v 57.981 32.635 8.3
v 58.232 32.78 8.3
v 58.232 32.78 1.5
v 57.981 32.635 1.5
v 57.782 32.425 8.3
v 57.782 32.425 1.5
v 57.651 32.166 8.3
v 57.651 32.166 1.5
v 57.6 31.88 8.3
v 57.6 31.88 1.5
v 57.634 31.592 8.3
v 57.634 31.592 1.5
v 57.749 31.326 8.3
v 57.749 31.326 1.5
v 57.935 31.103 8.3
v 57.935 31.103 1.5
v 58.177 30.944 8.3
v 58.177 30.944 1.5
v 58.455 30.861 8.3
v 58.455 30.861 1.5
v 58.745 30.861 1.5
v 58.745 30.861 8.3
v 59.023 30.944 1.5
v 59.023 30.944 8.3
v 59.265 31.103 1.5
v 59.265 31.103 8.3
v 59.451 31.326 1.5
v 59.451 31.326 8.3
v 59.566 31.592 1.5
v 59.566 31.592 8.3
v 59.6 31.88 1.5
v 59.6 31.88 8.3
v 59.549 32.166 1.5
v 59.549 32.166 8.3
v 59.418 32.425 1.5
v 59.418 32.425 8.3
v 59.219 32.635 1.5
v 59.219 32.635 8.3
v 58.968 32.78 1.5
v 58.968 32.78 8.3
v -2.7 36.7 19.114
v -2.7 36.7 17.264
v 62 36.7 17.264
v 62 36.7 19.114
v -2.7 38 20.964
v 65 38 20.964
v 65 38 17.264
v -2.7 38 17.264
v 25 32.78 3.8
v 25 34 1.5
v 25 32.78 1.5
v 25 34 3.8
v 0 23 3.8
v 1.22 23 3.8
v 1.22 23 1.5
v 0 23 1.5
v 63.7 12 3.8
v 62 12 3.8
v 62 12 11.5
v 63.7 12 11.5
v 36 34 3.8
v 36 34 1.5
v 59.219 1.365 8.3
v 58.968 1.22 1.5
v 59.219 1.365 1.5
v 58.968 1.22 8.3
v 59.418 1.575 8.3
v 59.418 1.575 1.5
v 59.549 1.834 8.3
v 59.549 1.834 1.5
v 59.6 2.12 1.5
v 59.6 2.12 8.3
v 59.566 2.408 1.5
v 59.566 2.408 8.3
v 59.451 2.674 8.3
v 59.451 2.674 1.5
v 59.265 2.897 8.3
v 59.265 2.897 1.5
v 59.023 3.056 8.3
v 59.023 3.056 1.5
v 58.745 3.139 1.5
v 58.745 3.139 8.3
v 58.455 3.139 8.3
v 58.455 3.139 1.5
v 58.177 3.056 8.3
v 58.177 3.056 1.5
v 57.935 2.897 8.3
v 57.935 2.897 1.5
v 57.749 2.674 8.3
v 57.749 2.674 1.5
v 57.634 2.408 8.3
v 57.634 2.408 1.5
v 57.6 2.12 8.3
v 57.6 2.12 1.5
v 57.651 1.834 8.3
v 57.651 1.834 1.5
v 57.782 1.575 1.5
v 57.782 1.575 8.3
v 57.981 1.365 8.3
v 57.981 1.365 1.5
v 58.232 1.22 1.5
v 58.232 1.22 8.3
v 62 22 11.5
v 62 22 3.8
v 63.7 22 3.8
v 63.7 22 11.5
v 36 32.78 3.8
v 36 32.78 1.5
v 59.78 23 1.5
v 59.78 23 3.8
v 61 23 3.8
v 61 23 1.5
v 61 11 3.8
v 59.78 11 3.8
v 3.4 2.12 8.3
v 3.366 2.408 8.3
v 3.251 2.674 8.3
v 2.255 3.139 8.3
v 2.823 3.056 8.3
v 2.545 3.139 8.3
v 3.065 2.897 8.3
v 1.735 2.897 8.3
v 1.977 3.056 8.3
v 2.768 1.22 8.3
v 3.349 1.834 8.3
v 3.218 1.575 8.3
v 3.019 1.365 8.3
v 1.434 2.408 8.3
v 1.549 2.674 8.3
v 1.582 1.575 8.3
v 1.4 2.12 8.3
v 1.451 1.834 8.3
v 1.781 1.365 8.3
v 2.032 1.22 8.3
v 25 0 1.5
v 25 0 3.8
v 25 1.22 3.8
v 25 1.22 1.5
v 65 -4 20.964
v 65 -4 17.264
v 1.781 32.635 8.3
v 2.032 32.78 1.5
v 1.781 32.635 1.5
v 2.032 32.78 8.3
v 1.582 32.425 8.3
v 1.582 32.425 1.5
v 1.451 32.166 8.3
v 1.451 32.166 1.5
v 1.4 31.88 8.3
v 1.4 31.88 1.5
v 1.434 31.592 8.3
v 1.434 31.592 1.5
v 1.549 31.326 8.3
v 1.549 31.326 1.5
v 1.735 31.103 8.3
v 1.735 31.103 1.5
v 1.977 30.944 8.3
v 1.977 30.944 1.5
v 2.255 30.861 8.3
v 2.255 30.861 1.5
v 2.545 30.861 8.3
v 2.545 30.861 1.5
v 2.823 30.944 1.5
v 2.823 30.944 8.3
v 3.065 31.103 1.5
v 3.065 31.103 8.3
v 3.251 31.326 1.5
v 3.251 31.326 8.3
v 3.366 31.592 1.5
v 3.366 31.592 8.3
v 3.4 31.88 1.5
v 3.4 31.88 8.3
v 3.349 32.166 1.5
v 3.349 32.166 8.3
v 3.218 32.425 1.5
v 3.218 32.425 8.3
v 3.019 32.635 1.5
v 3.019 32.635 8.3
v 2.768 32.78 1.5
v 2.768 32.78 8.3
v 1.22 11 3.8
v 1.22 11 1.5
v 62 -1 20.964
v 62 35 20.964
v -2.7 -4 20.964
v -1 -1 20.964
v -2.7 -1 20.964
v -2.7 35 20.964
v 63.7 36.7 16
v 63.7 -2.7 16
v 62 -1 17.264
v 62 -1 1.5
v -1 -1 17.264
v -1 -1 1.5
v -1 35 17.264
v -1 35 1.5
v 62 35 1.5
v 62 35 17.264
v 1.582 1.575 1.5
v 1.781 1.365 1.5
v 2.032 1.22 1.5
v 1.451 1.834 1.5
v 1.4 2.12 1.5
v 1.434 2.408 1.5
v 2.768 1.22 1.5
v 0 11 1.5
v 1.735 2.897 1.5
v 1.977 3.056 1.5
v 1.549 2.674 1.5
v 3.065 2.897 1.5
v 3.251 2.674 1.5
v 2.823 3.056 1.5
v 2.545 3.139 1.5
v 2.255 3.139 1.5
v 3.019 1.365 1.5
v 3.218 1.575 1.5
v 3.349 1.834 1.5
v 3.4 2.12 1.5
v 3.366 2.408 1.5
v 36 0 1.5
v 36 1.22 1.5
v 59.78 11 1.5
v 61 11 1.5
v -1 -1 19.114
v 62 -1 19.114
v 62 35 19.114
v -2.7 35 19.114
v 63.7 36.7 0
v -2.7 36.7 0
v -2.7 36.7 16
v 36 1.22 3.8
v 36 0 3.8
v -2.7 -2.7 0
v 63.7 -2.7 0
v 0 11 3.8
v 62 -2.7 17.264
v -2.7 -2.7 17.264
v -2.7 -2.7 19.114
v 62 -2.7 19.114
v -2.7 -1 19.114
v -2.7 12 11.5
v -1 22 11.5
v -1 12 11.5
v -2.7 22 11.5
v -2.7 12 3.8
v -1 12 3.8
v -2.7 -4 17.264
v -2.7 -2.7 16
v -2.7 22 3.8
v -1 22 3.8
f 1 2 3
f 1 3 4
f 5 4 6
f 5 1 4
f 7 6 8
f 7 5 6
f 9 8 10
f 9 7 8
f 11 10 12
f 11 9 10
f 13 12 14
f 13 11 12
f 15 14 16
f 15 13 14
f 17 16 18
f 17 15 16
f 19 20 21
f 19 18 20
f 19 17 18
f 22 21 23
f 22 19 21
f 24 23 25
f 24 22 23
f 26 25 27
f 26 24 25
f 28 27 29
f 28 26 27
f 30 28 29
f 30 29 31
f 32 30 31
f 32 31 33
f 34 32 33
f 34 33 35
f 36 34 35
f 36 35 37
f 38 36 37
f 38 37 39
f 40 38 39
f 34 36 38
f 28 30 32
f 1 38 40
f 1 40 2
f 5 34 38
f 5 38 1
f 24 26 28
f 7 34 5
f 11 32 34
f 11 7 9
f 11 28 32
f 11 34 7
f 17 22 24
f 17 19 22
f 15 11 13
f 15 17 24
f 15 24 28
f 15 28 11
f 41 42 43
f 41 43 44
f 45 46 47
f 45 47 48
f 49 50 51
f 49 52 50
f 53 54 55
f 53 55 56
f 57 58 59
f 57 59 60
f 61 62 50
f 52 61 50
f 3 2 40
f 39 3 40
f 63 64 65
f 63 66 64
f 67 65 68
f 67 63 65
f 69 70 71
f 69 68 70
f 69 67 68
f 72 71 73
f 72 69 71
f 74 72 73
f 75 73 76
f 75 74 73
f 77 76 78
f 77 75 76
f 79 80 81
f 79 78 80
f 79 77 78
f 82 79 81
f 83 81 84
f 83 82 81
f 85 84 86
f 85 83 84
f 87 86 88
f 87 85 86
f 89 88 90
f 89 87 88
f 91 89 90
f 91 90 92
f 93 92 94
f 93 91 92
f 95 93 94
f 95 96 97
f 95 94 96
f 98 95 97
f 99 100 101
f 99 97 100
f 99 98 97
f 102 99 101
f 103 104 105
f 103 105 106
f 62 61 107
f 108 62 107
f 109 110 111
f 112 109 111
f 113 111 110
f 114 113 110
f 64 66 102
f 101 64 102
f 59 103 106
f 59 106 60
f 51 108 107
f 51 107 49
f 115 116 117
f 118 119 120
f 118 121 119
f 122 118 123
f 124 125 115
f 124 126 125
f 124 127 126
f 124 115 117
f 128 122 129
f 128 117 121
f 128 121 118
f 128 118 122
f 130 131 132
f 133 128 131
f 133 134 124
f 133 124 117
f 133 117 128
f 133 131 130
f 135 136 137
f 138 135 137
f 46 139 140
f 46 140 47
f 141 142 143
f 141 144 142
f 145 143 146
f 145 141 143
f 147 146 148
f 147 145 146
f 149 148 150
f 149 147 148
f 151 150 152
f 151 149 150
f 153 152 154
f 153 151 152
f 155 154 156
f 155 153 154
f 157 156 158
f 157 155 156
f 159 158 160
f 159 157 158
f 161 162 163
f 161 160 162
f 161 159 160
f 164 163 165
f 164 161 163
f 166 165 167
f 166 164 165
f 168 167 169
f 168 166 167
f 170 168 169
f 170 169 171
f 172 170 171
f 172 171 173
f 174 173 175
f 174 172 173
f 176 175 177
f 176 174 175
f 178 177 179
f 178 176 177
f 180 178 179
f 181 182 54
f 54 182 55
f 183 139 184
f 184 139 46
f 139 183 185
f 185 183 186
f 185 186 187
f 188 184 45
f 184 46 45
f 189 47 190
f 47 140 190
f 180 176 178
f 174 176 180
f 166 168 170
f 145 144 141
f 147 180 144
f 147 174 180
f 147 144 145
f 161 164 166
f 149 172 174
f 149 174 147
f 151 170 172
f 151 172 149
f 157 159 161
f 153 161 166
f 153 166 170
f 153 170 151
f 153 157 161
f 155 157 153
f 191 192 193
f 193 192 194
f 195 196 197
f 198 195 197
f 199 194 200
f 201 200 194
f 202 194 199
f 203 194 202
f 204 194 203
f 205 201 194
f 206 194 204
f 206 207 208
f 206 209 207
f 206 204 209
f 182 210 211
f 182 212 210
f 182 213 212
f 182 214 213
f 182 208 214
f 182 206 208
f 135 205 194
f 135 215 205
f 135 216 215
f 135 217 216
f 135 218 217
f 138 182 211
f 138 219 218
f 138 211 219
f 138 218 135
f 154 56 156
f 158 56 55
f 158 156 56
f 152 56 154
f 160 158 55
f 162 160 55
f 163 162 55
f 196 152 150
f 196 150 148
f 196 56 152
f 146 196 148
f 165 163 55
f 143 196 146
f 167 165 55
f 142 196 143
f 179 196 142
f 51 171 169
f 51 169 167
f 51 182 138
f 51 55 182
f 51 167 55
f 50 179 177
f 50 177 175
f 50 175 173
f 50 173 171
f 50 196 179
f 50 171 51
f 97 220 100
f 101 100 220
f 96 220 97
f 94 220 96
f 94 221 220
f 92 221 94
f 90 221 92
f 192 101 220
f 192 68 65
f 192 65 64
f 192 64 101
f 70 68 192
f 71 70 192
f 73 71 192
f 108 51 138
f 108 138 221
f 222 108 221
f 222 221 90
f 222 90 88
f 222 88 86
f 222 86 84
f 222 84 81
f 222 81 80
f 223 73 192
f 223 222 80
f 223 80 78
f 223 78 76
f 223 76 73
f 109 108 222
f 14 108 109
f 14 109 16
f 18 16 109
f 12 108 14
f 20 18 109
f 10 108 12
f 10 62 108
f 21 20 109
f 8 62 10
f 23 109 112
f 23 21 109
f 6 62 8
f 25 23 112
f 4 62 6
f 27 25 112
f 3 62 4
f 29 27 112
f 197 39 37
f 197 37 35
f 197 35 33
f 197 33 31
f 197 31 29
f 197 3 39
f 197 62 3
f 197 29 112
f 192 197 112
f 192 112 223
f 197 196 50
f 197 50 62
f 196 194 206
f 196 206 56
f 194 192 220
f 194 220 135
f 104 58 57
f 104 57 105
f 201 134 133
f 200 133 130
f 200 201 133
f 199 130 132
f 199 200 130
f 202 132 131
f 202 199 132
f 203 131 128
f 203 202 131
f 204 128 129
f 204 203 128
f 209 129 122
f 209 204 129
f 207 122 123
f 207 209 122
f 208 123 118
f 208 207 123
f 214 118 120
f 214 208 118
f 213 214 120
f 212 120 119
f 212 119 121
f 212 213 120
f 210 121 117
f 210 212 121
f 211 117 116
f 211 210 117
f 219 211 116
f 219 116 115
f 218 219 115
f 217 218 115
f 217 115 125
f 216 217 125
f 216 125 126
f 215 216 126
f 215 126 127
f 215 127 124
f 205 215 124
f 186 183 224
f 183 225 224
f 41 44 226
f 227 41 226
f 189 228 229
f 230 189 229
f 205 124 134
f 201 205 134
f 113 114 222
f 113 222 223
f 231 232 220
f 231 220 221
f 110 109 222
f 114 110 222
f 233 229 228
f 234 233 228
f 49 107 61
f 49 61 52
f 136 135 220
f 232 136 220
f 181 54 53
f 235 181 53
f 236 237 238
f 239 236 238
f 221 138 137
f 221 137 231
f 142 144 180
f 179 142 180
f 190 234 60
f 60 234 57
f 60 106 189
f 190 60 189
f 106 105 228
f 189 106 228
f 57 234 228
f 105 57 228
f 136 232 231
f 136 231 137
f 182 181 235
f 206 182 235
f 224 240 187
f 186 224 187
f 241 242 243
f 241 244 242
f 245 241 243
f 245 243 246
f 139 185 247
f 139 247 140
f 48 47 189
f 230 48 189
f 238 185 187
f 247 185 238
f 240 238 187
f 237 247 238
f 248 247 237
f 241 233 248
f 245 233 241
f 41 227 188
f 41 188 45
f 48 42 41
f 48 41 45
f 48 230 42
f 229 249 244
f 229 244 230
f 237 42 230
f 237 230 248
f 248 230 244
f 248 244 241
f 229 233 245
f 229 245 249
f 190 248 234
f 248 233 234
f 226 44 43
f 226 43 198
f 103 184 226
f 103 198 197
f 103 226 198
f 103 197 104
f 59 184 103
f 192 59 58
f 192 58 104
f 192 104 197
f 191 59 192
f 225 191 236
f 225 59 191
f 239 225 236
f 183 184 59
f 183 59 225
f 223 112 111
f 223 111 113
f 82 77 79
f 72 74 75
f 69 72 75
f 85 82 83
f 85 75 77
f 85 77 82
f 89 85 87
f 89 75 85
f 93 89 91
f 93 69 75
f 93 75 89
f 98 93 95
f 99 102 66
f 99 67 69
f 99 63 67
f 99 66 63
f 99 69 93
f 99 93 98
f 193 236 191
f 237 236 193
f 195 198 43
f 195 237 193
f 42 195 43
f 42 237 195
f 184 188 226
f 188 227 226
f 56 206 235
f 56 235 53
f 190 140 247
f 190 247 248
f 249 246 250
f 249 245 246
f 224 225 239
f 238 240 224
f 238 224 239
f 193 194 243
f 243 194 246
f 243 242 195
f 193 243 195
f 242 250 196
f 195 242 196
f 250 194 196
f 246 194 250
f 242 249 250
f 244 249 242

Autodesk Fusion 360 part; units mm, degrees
sketch "Spodek" plane through (0, 0, 0) normal (0, 0, 1) x (1, 0, 0)
  line L0 (0, 0) -> (61, 0)
  line L1 (61, 0) -> (61, 34)
  line L2 (61, 34) -> (0, 34)
  line L3 (0, 34) -> (0, 0)
  line L4 (-1, 35) -> (62, 35)
  line L5 (62, 35) -> (62, -1)
  line L6 (62, -1) -> (-1, -1)
  line L7 (-1, -1) -> (-1, 35)
  line L8 (-2.7, -2.7) -> (-2.7, 36.7) construction
  line L9 (63.7, 36.7) -> (-2.7, 36.7) construction
  line L10 (63.7, -2.7) -> (63.7, 36.7) construction
  line L11 (63.7, -2.7) -> (-2.7, -2.7) construction
  line L12 (-2.7, -2.7) -> (63.7, -2.7)
  line L13 (63.7, -2.7) -> (63.7, 36.7)
  line L14 (63.7, 36.7) -> (-2.7, 36.7)
  line L15 (-2.7, 36.7) -> (-2.7, -2.7)
  dimension "d1" = 61
  dimension "d2" = 34
  dimension "d3" = 63
  dimension "d4" = 36
  dimension "d5" = 1.7
  dimension "d6" = 1.7
  dimension "d7" = 1.7
  dimension "d8" = 1.7
sketch "TotoNevim" plane through (0, 0, 0) normal (0, 0, 1) x (1, 0, 0)
extrude "Extrude1" add sketch "Spodek" along normal blind 12 contours L12 L13 L14 L15 makes body 1
extrude "Extrude2" add sketch "Spodek" along normal blind 1.5 contours L0 L1 L2 L3 | L4 L5 L6 L7 bodies 1
sketch "Sketch3" plane through (0, 0, 1.5) normal (0, 0, 1) x (-1, 0, 0)
  line L0 (1, 1) -> (-62, 1)
  line L1 (-62, 1) -> (-62, -35)
  line L2 (-62, -35) -> (1, -35)
  line L3 (1, -35) -> (1, 1)
  line L4 (-59.78, -32.78) -> (-1.22, -32.78)
  line L5 (-1.22, -32.78) -> (-1.22, -1.22)
  line L6 (-1.22, -1.22) -> (-59.78, -1.22)
  line L7 (-59.78, -1.22) -> (-59.78, -32.78)
  line L8 (-61, 0) -> (-61, -34)
  line L9 (0, 0) -> (-61, 0)
  line L10 (0, -34) -> (0, 0)
  line L11 (-61, -34) -> (0, -34)
  dimension "d13" = 1.22
  dimension "d14" = 1.22
  dimension "d15" = 1.22
  dimension "d16" = 1.22
extrude "Extrude3" add sketch "Sketch3" along normal blind 1.8 contours L8 L9 L10 L11 bodies 1
extrude "Extrude4" add 1 faces at (20, -2.1333, 12) along direction (0, 0, 1) blind 5.243 on bodies 1 bodies 1
extrude "Extrude5" add 1 faces at (20, -2.1333, 17.243) along direction (0, 0, 1) blind 0.021 on bodies 1 bodies 1
sketch "Prurez1" plane through (-2.7, 0, 0) normal (-1, 0, 0) x (0, -1, 0)
  line L0 (-36.7, 0) -> (2.7, 0)
  line L1 (2.7, 0) -> (2.7, 17.264)
  line L2 (2.7, 17.264) -> (-36.7, 17.264)
  line L3 (-36.7, 17.264) -> (-36.7, 0)
  line L4 (-12, 3.3) -> (-12, 11) construction
  line L5 (0, 1.5) -> (0, 3.3) construction
  line L6 (-22, 11) -> (-22, 3.3) construction
  line L7 (-34, 3.3) -> (-34, 11) construction
  line L8 (-35, 1.5) -> (-35, 17.264) construction
  line L9 (-22, 11) -> (-12, 11) construction
  line L10 (-12, 11) -> (-12, 3.3) construction
  line L11 (-12, 3.3) -> (-22, 3.3) construction
  line L12 (-22, 3.3) -> (-22, 11) construction
  line L13 (-22, 11) -> (-12, 11)
  line L14 (-12, 11) -> (-12, 3.3)
  line L15 (-12, 3.3) -> (-22, 3.3)
  line L16 (-22, 3.3) -> (-22, 11)
  dimension "d23" = 7.7
  dimension "d24" = 12
  dimension "d25" = 12
  dimension "d26" = 1
extrude "Extrude6" cut sketch "Prurez1" against normal up to surface (66.4 mm away) contours L13 L14 L15 L16 bodies 1
sketch "Sketch5" plane through (0, 0, 17.264) normal (0, 0, 1) x (-1, 0, 0)
  line L0 (-62, 1) -> (1, 1)
  line L1 (1, 1) -> (1, -35)
  line L2 (1, -35) -> (-62, -35)
  line L3 (-62, -35) -> (-62, 1)
  line L4 (2.7, -36.7) -> (2.7, 2.7)
  line L5 (2.7, 2.7) -> (-63.7, 2.7)
  line L6 (-63.7, 2.7) -> (-63.7, -36.7)
  line L7 (-63.7, -36.7) -> (2.7, -36.7)
  line L8 (2.7, -36.7) -> (-63.7, -36.7)
  line L9 (-63.7, -36.7) -> (-63.7, 2.7)
  line L10 (-63.7, 2.7) -> (2.7, 2.7)
  line L11 (2.7, 2.7) -> (2.7, -36.7)
  line L12 (1, -35) -> (-62, -35)
  line L13 (-62, -35) -> (-62, 1)
  line L14 (-62, 1) -> (1, 1)
  line L15 (1, 1) -> (1, -35)
extrude "Extrude7" add sketch "Sketch5" along normal blind 3.7 bodies 1
sketch "Sketch6" plane through (-2.7, 0, 0) normal (-1, 0, 0) x (0, -1, 0)
  line L0 (-22, 3.3) -> (-22, 11)
  line L1 (-22, 11) -> (-12, 11)
  line L2 (-12, 11) -> (-12, 3.3)
  line L3 (-12, 3.3) -> (-22, 3.3)
  line L4 (-36.7, 0) -> (2.7, 0)
  line L5 (2.7, 0) -> (2.7, 20.964)
  line L6 (2.7, 20.964) -> (-36.7, 20.964)
  line L7 (-36.7, 20.964) -> (-36.7, 0)
  line L8 (-35, 17.264) -> (1.0001, 17.264)
  line L9 (1.0001, 17.264) -> (1.0001, 20.964)
  line L10 (1.0001, 20.964) -> (-35, 20.964)
  line L11 (-35, 20.964) -> (-35, 17.264)
  line L12 (-36.7, 17.264) -> (2.7, 17.264)
extrude "Extrude8" cut sketch "Sketch6" against normal up to surface (64.7 mm away) contours L6 L8 L9 L10 L11 L12 bodies 1
sketch "BokFront" plane through (0, -2.7, 0) normal (0, -1, 0) x (1, 0, 0)
  line L0 (-2.7, 0) -> (63.7, 0)
  line L1 (63.7, 0) -> (63.7, 20.964)
  line L2 (63.7, 20.964) -> (-2.7, 20.964)
  line L3 (-2.7, 20.964) -> (-2.7, 0)
  line L4 (-2.7, 20.964) -> (63.7, 20.964)
  line L5 (63.7, 20.964) -> (63.7, 17.264)
  line L6 (63.7, 17.264) -> (-2.7, 17.264)
  line L7 (-2.7, 17.264) -> (-2.7, 20.964)
  point P0 (63.7, 17.264)
sketch "BokRight" plane through (63.7, 0, 0) normal (1, 0, 0) x (0, 1, 0)
  line L0 (22, 11) -> (22, 3.3)
  line L1 (22, 3.3) -> (12, 3.3)
  line L2 (12, 3.3) -> (12, 11)
  line L3 (12, 11) -> (22, 11)
  line L4 (-2.7, 0) -> (36.7, 0)
  line L5 (36.7, 0) -> (36.7, 20.964)
  line L6 (36.7, 20.964) -> (-2.7, 20.964)
  line L7 (-2.7, 20.964) -> (-2.7, 0)
  line L8 (-2.7, 20.964) -> (36.7, 20.964)
  line L9 (36.7, 20.964) -> (36.7, 17.264)
  line L10 (36.7, 17.264) -> (-2.7, 17.264)
  line L11 (-2.7, 17.264) -> (-2.7, 20.964)
  point P0 (36.7, 17.264)
sketch "BokBack" plane through (0, 36.7, 0) normal (0, 1, 0) x (-1, 0, 0)
  line L0 (-63.7, 0) -> (2.7, 0)
  line L1 (2.7, 0) -> (2.7, 20.964)
  line L2 (2.7, 20.964) -> (-63.7, 20.964)
  line L3 (-63.7, 20.964) -> (-63.7, 0)
  line L4 (-63.7, 20.964) -> (2.7, 20.964)
  line L5 (2.7, 20.964) -> (2.7, 17.264)
  line L6 (2.7, 17.264) -> (-63.7, 17.264)
  line L7 (-63.7, 17.264) -> (-63.7, 20.964)
  point P0 (2.7, 17.264)
extrude "Extrude9" add sketch "BokBack" along normal blind 1.3 contours L1 L2 L3 L4 L5 L6 L7 bodies 1
extrude "Extrude10" add sketch "BokFront" along normal blind 1.3 contours L1 L2 L3 L4 L5 L6 L7 bodies 1
extrude "Extrude11" add sketch "BokRight" along normal blind 1.3 contours L5 L6 L7 L8 L9 L10 L11 bodies 1
extrude "Extrude12" add 1 faces at (63.7, 37.5667, 19.7307) along direction (1, 0, 0) blind 1.3 on bodies 1 bodies 1
extrude "Extrude13" add 1 faces at (63.7, -3.1333, 19.7307) along direction (1, 0, 0) blind 1.3 on bodies 1 bodies 1
sketch "Sketch10" plane through (-2.7, 0, 0) normal (-1, 0, 0) x (0, -1, 0)
  line L0 (-35, 17.264) -> (-35, 20.964)
  line L1 (-35, 20.964) -> (-38, 20.964)
  line L2 (-38, 20.964) -> (-38, 17.264)
  line L3 (-38, 17.264) -> (-36.7, 17.264)
  line L4 (-36.7, 17.264) -> (-36.7, 0)
  line L5 (-36.7, 0) -> (2.7, 0)
  line L6 (2.7, 0) -> (2.7, 17.264)
  line L7 (2.7, 17.264) -> (4, 17.264)
  line L8 (4, 17.264) -> (4, 20.964)
  line L9 (4, 20.964) -> (1.0001, 20.964)
  line L10 (1.0001, 20.964) -> (1.0001, 17.264)
  line L11 (1.0001, 17.264) -> (-35, 17.264)
  line L12 (-22, 3.3) -> (-22, 11)
  line L13 (-22, 11) -> (-12, 11)
  line L14 (-12, 11) -> (-12, 3.3)
  line L15 (-12, 3.3) -> (-22, 3.3)
  line L16 (4, 17.264) -> (2.7, 16)
  line L17 (-38, 17.264) -> (-36.7, 16)
extrude "Extrude14" add sketch "Sketch10" against normal up to surface (67.7 mm away) contours L3 L4 L17 | L6 L7 L16 bodies 1
sketch "Sketch11" plane through (0, -2.7, 0) normal (0, 1, 0) x (-1, 0, 0)
  line L0 (-63.7, 16) -> (-63.7, 17.264)
  line L1 (-63.7, 17.264) -> (-65, 17.264)
  line L2 (-65, 17.264) -> (-65, 16)
  line L3 (-65, 16) -> (-63.7, 16)
  line L4 (-65, 17.264) -> (-63.7, 16)
extrude "Extrude15" add sketch "Sketch11" along normal blind 39.4 contours L0 L1 L4 bodies 1
extrude "Extrude16" cut 1 faces at (64.5667, -2.7, 16.4213) along direction (0, -1, 0) blind 5.3 on bodies 1 bodies 1
extrude "Extrude17" cut 1 faces at (64.5667, 36.7, 16.4213) along direction (0, 1, 0) blind 1.9 on bodies 1 bodies 1
sketch "Sketch12" plane through (-2.7, 35.85, 19.114) normal (-1, 0, 0) x (0, -1, 0)
  line L0 (-0.85, 0) -> (0.85, 0)
  line L1 (0.85, 0) -> (0.85, -1.85)
  line L2 (0.85, -1.85) -> (-0.85, -1.85)
  line L3 (-0.85, -1.85) -> (-0.85, 0)
  line L4 (-0.85, 1.85) -> (-0.85, -19.114)
  line L5 (36.8501, -1.85) -> (38.55, -1.85)
  line L6 (38.55, -1.85) -> (38.55, 0)
  line L7 (38.55, 0) -> (36.8501, 0)
  line L8 (36.8501, 0) -> (36.8501, -1.85)
  line L9 (38.55, -19.114) -> (38.55, 1.85)
  point P0 (0.85, -1.85)
  point P1 (36.8501, -1.85)
extrude "Extrude18" cut sketch "Sketch12" against normal blind 64.7 bodies 1
sketch "Sketch13" plane through (62, 0, 0) normal (-1, 0, 0) x (0, -1, 0)
  line L0 (-35, 17.264) -> (-35, 1.5)
  line L1 (-35, 1.5) -> (1, 1.5)
  line L2 (1, 1.5) -> (1, 17.264)
  line L3 (1.0001, 17.264) -> (2.7, 17.264)
  line L4 (2.7, 17.264) -> (2.7, 19.114)
  line L5 (2.7, 19.114) -> (1.0001, 19.114)
  line L6 (1, 19.114) -> (1, 20.964)
  line L7 (1, 20.964) -> (-35, 20.964)
  line L8 (-35, 20.964) -> (-35, 19.114)
  line L9 (-35, 19.114) -> (-36.7, 19.114)
  line L10 (-36.7, 19.114) -> (-36.7, 17.264)
  line L11 (-36.7, 17.264) -> (-35, 17.264)
  line L12 (-22, 3.3) -> (-22, 11)
  line L13 (-22, 11) -> (-12, 11)
  line L14 (-12, 11) -> (-12, 3.3)
  line L15 (-12, 3.3) -> (-22, 3.3)
  line L16 (-36.7, 19.114) -> (2.7, 19.114)
  line L17 (2.7, 19.114) -> (2.7, 17.264)
  line L18 (2.7, 17.264) -> (-36.7, 17.264)
  line L19 (-36.7, 17.264) -> (-36.7, 19.114)
extrude "Extrude19" cut sketch "Sketch13" against normal blind 1.7 contours L3 L4 L5 L9 L10 L11 L16 L17 L18 L19 bodies 1
sketch "Sketch14" plane through (0, 0, 3.3) normal (0, 0, 1) x (-1, 0, 0)
  line L0 (0, -34) -> (0, 0)
  line L1 (0, 0) -> (-61, 0)
  line L2 (-61, 0) -> (-61, -34)
  line L3 (-61, -34) -> (0, -34)
  line L4 (-1.22, -1.22) -> (-1.22, -32.78)
  line L5 (-1.22, -32.78) -> (-59.78, -32.78)
  line L6 (-59.78, -32.78) -> (-59.78, -1.22)
  line L7 (-59.78, -1.22) -> (-1.22, -1.22)
  circle A0 centre (-58.6, -31.85) radius 1
  line L8 (-61, -17) -> (0, -17) construction
  circle A1 centre (-58.6, -2.15) radius 1
  line L9 (-30.5, -34) -> (-30.5, 0) construction
  circle A2 centre (-2.4, -31.85) radius 1
  circle A3 centre (-2.4, -2.15) radius 1
  point P0 (-58.6, -31.85)
  dimension "d55" = 2.15
  dimension "d56" = 2.4
  dimension "d57" = 2
extrude "Extrude20" add sketch "Sketch14" along normal blind 5 separate body contours L7 A3 | L5 A2 | L7 A1 | L5 A0 picked at (-2.6077, -1.9583) picked at (-2.278, -32.1598) picked at (-58.2997, -2.1959) picked at (-58.3551, -31.7867) makes body 2 at (59.2633, 32.5983, 6.6333) makes body 3 at (59.1416, 2.9907, 6.6333) makes body 4 at (3.0633, 32.5983, 6.6333) makes body 5 at (2.8103, 3.062, 6.6333)
extrude "Extrude21" add 4 faces at (2.6077, 1.9583, 3.3) (2.278, 32.1598, 3.3) (58.3551, 31.7867, 3.3) (58.2997, 2.1959, 3.3) along direction (0, 0, -1) blind 2 on bodies 2 3 4 5 bodies 5 1 2 3 4
extrude "Extrude22" add 1 faces at (39.7441, 0.4067, 3.3) along direction (0, 0, 1) blind 0.5 on bodies 5 bodies 5
sketch "Sketch15" plane through (0, 0, 3.8) normal (0, 0, 1) x (-1, 0, 0)
  line L0 (0, -34) -> (0, 0)
  line L1 (0, 0) -> (-61, 0)
  line L2 (-61, 0) -> (-61, -34)
  line L3 (-61, -34) -> (0, -34)
  line L4 (-1.22, -1.22) -> (-1.22, -32.78)
  line L5 (-1.22, -32.78) -> (-2.0324, -32.78)
  line L6 (-2.0324, -32.78) -> (-2.7676, -32.78)
  line L7 (-2.7676, -32.78) -> (-58.2324, -32.78)
  line L8 (-58.2324, -32.78) -> (-58.9676, -32.78)
  line L9 (-58.9676, -32.78) -> (-59.78, -32.78)
  line L10 (-59.78, -32.78) -> (-59.78, -1.22)
  line L11 (-59.78, -1.22) -> (-58.9676, -1.22)
  line L12 (-58.9676, -1.22) -> (-58.2324, -1.22)
  line L13 (-58.2324, -1.22) -> (-2.7676, -1.22)
  line L14 (-2.7676, -1.22) -> (-2.0324, -1.22)
  line L15 (-2.0324, -1.22) -> (-1.22, -1.22)
  line L16 (0, -34) -> (-1.22, -34)
  line L17 (-1.22, -34) -> (-1.22, -23)
  line L18 (-1.22, -23) -> (0, -23)
  line L19 (0, -23) -> (0, -34)
  line L20 (0, 0) -> (-1.22, 0)
  line L21 (-1.22, 0) -> (-1.22, -11)
  line L22 (-1.22, -11) -> (0, -11)
  line L23 (0, -11) -> (0, 0)
  line L24 (0, 0) -> (-25, 0)
  line L25 (-25, 0) -> (-25, -1.22)
  line L26 (-25, -1.22) -> (0, -1.22)
  line L27 (0, -1.22) -> (0, 0)
  line L28 (-61, 0) -> (-36, 0)
  line L29 (-36, 0) -> (-36, -1.22)
  line L30 (-36, -1.22) -> (-61, -1.22)
  line L31 (-61, -1.22) -> (-61, 0)
  line L32 (-61, 0) -> (-59.78, 0)
  line L33 (-59.78, 0) -> (-59.78, -11)
  line L34 (-59.78, -11) -> (-61, -11)
  line L35 (-61, -11) -> (-61, 0)
  line L36 (-61, -34) -> (-59.78, -34)
  line L37 (-59.78, -34) -> (-59.78, -23)
  line L38 (-59.78, -23) -> (-61, -23)
  line L39 (-61, -23) -> (-61, -34)
  line L40 (0, -34) -> (-25, -34)
  line L41 (-25, -34) -> (-25, -32.78)
  line L42 (-25, -32.78) -> (0, -32.78)
  line L43 (0, -32.78) -> (0, -34)
  line L44 (-61, -34) -> (-36, -34)
  line L45 (-36, -34) -> (-36, -32.78)
  line L46 (-36, -32.78) -> (-61, -32.78)
  line L47 (-61, -32.78) -> (-61, -34)
  dimension "d64" = 11
  dimension "d65" = 11
  dimension "d66" = 25
  dimension "d67" = 25
  dimension "d68" = 11
  dimension "d69" = 11
  dimension "d70" = 25
  dimension "d71" = 25
extrude "Extrude23" cut sketch "Sketch15" against normal blind 2.3 contours L0 L3 L16 L17 L19 L40 L42 L43 | L3 L5 L6 L7 L17 L40 L41 L42 bodies 5
extrude "Extrude24" cut sketch "Sketch15" against normal blind 2.3 contours L3 L7 L8 L9 L37 L44 L45 L46 | L2 L3 L36 L37 L39 L44 L46 L47 bodies 5
extrude "Extrude25" cut sketch "Sketch15" against normal blind 2.3 contours L2 L10 L37 L38 L39 L46 bodies 5
extrude "Extrude26" cut sketch "Sketch15" against normal blind 2.3 contours L0 L4 L21 L22 L23 L26 | L0 L1 L20 L21 L23 L24 L26 L27 | L1 L13 L14 L15 L21 L24 L25 L26 | L2 L10 L30 L33 L34 L35 | L1 L11 L12 L13 L28 L29 L30 L33 | L1 L2 L28 L30 L31 L32 L33 L35 bodies 5
extrude "Extrude27" cut sketch "Sketch15" against normal blind 2.3 contours L0 L4 L17 L18 L19 L42 bodies 5
extrude "Extrude28" cut 1 faces at (63.1333, 18.6667, 11) along direction (0, 0, 1) blind 0.5 on bodies 5 bodies 5
extrude "Extrude29" cut 1 faces at (-2.1333, 18.6667, 11) along direction (0, 0, 1) blind 0.5 on bodies 5 bodies 5
extrude "Extrude30" add 1 faces at (-2.1333, 15.3333, 3.3) along direction (0, 0, 1) blind 0.5 on bodies 5 bodies 5
extrude "Extrude31" add 1 faces at (63.1333, 15.3333, 3.3) along direction (0, 0, 1) blind 0.5 on bodies 5 bodies 5
extrude "Extrude32" add 1 faces at (63.7, 10.4333, 17.8807) along direction (-1, 0, 0) blind 1.7 on bodies 5 bodies 5
equation "d19 = 14 mm - 8.757 mm"
equation "d21 = 14 mm - 13.979 mm"
equation "d33 = 3 mm - 1.70 mm"
equation "d35 = 3 mm - 1.70 mm"
equation "d37 = 3 mm - 1.70 mm"
